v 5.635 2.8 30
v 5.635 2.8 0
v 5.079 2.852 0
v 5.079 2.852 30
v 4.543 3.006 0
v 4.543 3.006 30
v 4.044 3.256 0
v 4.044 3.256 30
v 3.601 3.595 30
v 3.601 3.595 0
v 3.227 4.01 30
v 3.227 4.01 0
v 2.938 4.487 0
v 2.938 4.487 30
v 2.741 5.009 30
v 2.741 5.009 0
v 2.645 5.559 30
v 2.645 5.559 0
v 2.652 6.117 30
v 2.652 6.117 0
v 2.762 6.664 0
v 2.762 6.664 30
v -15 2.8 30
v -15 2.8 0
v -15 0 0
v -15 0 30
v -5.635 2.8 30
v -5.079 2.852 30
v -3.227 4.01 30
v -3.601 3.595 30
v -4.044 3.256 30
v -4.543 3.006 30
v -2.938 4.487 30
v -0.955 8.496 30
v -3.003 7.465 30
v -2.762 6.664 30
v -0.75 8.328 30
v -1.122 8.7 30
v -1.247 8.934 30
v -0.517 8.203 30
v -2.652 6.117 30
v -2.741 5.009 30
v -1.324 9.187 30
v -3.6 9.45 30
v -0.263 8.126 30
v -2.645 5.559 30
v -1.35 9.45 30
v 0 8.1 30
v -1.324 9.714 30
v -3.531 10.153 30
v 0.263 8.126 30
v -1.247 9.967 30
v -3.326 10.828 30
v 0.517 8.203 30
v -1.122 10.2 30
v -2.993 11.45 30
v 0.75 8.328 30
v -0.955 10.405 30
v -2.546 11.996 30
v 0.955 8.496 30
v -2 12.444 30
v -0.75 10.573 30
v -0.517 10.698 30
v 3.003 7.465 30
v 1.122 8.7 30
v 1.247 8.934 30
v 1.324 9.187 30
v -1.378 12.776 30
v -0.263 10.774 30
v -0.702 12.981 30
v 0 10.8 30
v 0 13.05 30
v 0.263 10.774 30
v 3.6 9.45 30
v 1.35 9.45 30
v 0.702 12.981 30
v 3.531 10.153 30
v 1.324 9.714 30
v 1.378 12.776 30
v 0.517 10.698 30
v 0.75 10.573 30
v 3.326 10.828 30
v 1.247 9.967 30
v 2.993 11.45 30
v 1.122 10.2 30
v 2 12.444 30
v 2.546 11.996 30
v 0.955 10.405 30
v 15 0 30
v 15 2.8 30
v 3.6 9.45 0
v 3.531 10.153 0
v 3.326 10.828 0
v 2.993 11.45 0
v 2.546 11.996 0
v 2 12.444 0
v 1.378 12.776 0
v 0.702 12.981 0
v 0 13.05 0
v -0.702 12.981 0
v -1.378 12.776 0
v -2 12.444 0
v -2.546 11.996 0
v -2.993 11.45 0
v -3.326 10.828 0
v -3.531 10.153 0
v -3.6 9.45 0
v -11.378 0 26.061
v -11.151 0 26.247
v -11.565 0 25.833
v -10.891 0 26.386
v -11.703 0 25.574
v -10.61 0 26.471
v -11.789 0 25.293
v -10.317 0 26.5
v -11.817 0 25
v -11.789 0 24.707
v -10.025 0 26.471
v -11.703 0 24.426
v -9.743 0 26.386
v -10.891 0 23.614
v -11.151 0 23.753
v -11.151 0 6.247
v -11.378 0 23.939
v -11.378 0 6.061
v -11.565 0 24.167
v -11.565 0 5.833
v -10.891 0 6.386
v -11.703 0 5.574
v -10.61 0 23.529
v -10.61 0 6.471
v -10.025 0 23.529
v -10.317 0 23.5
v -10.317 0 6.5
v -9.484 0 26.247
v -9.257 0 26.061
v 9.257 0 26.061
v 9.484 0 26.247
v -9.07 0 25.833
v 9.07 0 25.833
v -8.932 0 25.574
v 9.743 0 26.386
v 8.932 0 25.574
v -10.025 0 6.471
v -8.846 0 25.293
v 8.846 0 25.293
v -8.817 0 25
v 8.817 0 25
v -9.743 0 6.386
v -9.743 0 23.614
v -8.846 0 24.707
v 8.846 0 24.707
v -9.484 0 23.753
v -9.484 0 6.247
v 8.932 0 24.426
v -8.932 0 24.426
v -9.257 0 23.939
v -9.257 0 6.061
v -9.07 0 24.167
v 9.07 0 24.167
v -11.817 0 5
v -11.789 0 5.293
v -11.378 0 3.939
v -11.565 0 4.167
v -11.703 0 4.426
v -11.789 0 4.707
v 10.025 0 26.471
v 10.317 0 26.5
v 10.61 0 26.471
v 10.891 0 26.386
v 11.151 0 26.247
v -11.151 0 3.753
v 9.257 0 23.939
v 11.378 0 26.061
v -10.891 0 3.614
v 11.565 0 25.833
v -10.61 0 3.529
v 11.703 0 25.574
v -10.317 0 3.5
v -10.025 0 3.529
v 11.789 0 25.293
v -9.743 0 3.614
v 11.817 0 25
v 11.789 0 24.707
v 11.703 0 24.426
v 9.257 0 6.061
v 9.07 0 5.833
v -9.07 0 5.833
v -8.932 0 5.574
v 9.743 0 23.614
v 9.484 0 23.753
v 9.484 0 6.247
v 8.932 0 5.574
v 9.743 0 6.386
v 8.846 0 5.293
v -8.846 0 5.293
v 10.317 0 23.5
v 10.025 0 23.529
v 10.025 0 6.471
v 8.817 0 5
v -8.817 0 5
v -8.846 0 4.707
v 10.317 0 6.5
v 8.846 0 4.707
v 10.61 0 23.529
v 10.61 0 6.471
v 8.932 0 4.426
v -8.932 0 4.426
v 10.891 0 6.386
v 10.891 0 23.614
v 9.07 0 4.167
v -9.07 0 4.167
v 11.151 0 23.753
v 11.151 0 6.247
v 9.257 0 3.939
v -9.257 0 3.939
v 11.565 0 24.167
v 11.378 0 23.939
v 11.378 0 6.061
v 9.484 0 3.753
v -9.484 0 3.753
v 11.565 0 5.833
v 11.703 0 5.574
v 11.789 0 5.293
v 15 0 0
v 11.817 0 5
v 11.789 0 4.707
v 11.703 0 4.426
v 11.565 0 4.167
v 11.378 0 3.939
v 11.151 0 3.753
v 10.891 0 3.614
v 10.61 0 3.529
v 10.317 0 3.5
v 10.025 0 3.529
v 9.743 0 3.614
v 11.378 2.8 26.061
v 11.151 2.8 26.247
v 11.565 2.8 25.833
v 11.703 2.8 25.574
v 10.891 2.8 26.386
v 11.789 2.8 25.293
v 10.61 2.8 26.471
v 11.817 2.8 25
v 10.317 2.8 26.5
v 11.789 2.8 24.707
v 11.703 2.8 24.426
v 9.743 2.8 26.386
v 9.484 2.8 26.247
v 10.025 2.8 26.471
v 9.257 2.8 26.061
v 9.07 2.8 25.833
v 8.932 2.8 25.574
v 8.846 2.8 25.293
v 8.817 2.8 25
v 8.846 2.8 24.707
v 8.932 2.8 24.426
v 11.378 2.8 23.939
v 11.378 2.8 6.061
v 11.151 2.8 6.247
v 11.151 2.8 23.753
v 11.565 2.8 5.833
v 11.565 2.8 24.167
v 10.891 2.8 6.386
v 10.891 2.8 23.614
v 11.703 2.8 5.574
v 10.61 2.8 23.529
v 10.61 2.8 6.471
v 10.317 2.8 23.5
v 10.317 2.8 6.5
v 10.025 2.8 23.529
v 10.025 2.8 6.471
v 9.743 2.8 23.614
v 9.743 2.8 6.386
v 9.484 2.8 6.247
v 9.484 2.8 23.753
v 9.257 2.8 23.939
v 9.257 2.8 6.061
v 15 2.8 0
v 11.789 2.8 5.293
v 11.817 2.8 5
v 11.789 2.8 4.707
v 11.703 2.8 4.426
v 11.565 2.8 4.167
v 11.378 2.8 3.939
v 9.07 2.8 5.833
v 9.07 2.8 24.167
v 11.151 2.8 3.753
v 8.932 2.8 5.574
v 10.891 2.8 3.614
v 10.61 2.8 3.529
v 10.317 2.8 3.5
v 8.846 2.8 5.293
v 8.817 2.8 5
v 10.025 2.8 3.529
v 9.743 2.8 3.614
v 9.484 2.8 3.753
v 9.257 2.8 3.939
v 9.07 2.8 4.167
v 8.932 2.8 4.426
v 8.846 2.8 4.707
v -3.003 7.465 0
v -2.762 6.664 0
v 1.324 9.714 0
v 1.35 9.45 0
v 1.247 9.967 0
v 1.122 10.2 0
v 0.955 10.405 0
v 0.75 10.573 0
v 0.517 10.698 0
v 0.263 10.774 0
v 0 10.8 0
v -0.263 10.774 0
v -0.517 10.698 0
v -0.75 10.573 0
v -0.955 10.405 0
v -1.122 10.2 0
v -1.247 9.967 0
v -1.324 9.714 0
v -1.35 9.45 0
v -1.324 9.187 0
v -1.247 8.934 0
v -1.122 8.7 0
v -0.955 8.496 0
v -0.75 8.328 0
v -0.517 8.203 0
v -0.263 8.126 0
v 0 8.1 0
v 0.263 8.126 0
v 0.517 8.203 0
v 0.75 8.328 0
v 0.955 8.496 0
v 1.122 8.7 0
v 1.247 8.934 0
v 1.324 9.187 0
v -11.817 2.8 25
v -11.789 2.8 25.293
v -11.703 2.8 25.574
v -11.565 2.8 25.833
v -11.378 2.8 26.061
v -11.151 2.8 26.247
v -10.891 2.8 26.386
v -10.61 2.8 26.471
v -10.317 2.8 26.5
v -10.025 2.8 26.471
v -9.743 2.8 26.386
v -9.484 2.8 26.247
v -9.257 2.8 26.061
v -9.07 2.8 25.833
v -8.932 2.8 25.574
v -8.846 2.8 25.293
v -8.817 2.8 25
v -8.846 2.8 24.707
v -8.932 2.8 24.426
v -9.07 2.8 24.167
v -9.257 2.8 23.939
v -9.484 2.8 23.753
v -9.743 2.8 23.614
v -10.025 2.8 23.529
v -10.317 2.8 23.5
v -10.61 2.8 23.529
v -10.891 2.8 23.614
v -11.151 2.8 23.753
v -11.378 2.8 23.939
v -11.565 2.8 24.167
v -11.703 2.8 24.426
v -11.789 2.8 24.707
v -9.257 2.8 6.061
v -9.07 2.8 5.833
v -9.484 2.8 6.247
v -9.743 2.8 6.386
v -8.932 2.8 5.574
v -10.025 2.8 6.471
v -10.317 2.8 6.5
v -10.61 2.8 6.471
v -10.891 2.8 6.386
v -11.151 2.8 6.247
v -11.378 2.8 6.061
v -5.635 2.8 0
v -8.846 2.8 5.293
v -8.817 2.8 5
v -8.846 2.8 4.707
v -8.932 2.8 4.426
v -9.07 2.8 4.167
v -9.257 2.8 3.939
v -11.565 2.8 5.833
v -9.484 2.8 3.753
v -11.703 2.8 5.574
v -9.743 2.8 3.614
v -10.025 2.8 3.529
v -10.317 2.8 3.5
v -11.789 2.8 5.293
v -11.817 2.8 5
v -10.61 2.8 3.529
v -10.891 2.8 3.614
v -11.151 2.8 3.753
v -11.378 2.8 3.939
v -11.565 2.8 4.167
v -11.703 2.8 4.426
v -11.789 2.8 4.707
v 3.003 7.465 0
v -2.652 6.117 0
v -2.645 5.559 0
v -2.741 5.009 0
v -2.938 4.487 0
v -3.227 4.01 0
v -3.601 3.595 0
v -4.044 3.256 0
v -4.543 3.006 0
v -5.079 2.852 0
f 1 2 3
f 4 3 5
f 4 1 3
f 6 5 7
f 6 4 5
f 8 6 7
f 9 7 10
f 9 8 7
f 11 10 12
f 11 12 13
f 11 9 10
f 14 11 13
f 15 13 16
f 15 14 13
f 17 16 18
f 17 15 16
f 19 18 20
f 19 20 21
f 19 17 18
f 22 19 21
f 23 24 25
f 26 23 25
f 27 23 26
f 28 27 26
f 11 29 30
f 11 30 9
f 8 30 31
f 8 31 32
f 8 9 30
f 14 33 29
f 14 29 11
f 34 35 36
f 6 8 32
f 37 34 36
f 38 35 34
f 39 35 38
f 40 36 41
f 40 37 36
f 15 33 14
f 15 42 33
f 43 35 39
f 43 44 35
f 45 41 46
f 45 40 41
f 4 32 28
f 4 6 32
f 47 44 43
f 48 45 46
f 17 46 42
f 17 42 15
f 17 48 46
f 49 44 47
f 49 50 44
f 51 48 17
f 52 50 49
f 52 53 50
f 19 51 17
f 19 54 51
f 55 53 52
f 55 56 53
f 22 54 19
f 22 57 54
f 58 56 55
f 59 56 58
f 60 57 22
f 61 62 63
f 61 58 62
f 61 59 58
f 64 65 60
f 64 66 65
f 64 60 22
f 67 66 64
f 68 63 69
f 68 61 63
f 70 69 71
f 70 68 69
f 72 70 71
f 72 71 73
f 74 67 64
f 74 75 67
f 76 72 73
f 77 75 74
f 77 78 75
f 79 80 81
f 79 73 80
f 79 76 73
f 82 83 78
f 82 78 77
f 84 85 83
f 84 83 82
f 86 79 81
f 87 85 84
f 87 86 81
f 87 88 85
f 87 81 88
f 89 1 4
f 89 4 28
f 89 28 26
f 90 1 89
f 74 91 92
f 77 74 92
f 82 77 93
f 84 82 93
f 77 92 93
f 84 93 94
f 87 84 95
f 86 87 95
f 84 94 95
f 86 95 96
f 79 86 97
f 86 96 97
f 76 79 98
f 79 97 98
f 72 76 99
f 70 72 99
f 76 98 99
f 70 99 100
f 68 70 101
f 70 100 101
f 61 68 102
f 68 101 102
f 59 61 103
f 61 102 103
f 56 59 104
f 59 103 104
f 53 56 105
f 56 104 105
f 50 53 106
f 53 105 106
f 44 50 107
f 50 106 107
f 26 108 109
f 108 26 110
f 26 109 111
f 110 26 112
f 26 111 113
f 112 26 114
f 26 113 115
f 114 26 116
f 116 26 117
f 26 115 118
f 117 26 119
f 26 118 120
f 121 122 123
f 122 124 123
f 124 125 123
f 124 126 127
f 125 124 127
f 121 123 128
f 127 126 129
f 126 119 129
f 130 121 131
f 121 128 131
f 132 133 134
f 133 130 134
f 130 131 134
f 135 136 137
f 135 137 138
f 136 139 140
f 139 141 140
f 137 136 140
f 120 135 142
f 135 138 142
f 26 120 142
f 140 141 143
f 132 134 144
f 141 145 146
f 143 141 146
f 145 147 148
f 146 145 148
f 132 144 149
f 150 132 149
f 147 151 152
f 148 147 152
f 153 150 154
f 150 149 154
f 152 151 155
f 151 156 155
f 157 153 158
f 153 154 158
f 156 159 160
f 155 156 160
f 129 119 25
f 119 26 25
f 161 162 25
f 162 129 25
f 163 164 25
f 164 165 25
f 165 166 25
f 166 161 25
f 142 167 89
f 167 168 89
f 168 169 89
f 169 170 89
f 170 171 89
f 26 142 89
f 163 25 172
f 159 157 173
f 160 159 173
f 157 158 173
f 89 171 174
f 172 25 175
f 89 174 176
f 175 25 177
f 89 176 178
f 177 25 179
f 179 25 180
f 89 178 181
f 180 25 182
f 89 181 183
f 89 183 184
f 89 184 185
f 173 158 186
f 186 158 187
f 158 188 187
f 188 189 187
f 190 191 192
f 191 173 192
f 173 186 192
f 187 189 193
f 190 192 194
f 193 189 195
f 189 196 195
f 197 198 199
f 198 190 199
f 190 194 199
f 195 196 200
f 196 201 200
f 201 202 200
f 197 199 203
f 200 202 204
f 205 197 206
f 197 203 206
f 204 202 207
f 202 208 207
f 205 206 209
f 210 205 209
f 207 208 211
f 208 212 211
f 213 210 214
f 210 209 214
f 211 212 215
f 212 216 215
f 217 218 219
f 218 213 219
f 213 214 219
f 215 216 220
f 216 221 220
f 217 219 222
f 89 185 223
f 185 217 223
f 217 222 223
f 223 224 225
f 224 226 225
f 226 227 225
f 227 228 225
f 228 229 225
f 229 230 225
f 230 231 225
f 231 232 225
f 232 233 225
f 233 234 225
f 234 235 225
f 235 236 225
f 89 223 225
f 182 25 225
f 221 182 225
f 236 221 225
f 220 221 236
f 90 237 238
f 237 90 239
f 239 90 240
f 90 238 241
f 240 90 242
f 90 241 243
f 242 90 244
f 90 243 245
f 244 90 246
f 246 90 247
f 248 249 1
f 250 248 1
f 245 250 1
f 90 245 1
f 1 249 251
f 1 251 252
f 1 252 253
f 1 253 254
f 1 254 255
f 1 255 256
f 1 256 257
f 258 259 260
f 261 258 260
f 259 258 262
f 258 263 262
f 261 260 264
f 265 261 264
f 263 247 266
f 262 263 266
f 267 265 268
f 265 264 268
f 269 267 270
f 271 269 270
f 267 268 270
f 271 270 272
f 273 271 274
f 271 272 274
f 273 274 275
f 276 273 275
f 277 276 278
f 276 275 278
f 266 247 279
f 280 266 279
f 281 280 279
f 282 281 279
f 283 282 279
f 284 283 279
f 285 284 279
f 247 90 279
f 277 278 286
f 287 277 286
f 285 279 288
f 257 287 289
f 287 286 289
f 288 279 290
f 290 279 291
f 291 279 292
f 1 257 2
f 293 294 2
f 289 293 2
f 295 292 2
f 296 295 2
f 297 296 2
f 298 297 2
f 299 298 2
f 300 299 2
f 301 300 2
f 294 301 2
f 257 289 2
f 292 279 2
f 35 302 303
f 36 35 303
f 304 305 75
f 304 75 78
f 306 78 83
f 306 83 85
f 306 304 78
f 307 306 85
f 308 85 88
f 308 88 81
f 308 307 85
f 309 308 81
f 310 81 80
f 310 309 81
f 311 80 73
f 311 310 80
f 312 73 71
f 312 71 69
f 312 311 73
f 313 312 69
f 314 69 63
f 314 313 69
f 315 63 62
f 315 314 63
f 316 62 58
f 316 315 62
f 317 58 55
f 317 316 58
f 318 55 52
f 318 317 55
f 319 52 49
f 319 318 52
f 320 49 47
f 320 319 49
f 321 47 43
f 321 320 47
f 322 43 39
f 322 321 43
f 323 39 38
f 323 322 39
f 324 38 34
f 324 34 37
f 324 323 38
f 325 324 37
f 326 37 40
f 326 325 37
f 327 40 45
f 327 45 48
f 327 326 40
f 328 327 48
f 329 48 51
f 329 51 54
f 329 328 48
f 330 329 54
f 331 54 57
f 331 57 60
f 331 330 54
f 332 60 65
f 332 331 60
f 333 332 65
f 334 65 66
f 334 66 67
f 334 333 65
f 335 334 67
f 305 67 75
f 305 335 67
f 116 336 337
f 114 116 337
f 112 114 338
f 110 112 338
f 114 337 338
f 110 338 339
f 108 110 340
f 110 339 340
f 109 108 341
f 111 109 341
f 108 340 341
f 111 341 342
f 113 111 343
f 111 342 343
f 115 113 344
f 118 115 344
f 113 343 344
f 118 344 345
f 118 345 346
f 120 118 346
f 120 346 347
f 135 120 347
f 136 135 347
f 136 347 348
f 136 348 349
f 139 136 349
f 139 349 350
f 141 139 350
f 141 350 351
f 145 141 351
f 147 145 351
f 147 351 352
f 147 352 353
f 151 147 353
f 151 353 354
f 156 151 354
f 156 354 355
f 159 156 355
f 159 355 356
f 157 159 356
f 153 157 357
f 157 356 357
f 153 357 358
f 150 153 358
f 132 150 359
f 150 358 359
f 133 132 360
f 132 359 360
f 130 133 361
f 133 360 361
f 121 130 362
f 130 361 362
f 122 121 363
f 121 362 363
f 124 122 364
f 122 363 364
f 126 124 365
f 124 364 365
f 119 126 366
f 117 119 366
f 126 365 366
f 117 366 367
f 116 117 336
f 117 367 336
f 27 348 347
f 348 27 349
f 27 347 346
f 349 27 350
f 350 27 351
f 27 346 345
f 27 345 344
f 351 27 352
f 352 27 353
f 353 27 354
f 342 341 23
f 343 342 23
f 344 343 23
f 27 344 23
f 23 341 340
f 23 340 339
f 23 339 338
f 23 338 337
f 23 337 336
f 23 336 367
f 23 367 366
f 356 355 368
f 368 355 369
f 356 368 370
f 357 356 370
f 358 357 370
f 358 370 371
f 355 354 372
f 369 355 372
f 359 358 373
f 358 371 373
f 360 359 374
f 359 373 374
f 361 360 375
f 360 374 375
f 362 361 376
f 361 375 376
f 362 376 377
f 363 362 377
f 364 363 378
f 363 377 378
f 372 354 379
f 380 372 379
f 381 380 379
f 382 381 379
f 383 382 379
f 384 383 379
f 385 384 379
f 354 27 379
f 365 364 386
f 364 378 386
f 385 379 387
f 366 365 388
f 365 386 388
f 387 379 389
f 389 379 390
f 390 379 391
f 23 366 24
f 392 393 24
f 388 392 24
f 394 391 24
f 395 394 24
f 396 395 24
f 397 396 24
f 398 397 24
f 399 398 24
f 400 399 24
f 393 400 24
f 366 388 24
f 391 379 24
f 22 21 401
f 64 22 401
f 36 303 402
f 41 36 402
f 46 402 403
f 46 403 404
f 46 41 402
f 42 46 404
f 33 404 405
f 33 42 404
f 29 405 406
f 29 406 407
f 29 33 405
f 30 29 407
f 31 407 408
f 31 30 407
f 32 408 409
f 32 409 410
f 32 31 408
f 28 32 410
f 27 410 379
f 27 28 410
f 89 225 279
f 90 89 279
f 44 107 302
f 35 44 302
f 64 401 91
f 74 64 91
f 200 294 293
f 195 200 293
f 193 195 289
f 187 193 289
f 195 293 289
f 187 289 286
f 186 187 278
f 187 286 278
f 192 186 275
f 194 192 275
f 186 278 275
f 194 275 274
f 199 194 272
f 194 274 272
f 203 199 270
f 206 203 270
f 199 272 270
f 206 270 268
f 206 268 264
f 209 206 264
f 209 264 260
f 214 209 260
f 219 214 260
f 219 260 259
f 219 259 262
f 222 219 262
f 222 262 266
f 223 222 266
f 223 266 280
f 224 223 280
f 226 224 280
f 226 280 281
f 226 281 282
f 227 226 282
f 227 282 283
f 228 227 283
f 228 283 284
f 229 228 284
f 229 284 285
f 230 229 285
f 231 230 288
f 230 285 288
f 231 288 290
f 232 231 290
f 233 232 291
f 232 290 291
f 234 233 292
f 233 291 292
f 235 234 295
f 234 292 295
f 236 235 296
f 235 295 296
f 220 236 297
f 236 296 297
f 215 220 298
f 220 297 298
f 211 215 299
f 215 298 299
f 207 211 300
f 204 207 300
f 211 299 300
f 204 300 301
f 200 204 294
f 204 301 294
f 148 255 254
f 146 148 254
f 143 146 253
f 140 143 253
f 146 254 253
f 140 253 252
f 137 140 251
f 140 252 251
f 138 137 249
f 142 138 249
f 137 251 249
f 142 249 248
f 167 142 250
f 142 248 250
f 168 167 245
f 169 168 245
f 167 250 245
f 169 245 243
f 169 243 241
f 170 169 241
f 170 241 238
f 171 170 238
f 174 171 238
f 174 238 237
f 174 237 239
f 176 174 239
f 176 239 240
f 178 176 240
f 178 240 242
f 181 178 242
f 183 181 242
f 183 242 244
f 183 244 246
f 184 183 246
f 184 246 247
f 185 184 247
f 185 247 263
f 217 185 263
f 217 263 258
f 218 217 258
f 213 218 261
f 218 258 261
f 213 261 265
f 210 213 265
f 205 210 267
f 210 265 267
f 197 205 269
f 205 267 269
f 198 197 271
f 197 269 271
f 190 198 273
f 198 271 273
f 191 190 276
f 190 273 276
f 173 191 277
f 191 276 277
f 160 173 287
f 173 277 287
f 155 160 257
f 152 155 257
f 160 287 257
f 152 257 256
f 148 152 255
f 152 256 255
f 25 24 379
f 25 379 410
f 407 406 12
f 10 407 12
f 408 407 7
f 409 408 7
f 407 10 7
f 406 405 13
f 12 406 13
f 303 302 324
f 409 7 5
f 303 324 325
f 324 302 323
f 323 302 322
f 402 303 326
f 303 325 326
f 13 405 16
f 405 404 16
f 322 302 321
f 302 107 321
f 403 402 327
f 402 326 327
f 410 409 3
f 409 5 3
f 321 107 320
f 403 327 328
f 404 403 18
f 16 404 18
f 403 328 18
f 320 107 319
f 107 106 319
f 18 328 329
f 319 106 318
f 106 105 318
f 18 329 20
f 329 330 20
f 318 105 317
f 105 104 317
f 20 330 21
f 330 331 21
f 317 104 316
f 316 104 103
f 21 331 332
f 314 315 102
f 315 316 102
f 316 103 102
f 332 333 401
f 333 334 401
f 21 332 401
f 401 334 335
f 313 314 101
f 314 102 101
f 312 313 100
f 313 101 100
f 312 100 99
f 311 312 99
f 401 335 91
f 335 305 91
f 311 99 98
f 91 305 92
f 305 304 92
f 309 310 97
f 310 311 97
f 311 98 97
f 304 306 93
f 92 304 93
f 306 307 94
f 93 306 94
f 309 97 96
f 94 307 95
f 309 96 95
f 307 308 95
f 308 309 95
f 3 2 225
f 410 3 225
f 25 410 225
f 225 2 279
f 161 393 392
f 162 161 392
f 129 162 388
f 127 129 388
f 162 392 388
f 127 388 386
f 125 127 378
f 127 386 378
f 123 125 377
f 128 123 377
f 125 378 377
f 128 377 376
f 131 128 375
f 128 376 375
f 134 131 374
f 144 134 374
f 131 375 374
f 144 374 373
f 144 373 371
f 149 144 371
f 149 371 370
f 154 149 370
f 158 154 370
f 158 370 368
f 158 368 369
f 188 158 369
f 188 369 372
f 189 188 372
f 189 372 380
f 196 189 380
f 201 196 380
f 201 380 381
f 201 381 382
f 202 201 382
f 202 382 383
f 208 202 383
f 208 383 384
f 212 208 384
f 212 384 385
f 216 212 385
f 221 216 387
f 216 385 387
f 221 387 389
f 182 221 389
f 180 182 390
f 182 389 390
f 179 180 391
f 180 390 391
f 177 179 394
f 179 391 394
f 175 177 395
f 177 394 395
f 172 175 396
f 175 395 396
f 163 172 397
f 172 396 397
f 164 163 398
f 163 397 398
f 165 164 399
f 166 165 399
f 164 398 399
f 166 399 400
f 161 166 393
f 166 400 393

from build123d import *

# Parameters (mm, degrees)
F0_R     = 1.35
F1_DEPTH = 30
F2_R     = 3
F3_R     = 1.5
F4_DEPTH = 25


with BuildPart() as f1:
    # F0 (on Top) → F1 (new body)
    with BuildSketch(Plane.XY):
        with BuildLine():
            ThreePointArc((-3.0028277119, 7.4646546511), (0, 5.85036), (3.0028277119, 7.4646546511))
            Line((3.0028277119, 7.4646546511), (3.6, 9.45036))
            ThreePointArc((3.6, 9.45036), (0, 13.05036), (-3.6, 9.45036))
            Line((-3.6, 9.45036), (-3.0028277119, 7.4646546511))
        make_face()
        with Locations((0, 9.45036)):
            Circle(F0_R, mode=Mode.SUBTRACT)
        with BuildLine():
            Line((-1.6, 2.8), (1.6, 2.8))
            Line((1.6, 2.8), (3.0028277119, 7.4646546511))
            ThreePointArc((3.0028277119, 7.4646546511), (0, 5.85036), (-3.0028277119, 7.4646546511))
            Line((-3.0028277119, 7.4646546511), (-1.6, 2.8))
        make_face()
        Polygon((-15, 0), (15, 0), (15, 2.8), (1.6, 2.8), (-1.6, 2.8), (-15, 2.8), align=None)
    extrude(amount=F1_DEPTH)

    # F2
    f2_edges = [f1.edges().sort_by_distance(p)[0] for p in [
        (-1.6, 2.8, 15),
        (1.6, 2.8, 15),
    ]]
    fillet(f2_edges, radius=F2_R)

    # F3 (on face) → F4 (cut)
    with BuildSketch(Plane(origin=(0, 2.8, 0), x_dir=(-1, 0, 0), z_dir=(0, 1, 0))):
        with Locations((-10.3174667911, 25)):
            Circle(F3_R)
        with Locations((-10.3174667911, 5)):
            Circle(F3_R)
        with Locations((10.31747, 5)):
            Circle(F3_R)
        with Locations((10.31747, 25)):
            Circle(F3_R)
    extrude(amount=-F4_DEPTH, mode=Mode.SUBTRACT)


solid = f1.part
